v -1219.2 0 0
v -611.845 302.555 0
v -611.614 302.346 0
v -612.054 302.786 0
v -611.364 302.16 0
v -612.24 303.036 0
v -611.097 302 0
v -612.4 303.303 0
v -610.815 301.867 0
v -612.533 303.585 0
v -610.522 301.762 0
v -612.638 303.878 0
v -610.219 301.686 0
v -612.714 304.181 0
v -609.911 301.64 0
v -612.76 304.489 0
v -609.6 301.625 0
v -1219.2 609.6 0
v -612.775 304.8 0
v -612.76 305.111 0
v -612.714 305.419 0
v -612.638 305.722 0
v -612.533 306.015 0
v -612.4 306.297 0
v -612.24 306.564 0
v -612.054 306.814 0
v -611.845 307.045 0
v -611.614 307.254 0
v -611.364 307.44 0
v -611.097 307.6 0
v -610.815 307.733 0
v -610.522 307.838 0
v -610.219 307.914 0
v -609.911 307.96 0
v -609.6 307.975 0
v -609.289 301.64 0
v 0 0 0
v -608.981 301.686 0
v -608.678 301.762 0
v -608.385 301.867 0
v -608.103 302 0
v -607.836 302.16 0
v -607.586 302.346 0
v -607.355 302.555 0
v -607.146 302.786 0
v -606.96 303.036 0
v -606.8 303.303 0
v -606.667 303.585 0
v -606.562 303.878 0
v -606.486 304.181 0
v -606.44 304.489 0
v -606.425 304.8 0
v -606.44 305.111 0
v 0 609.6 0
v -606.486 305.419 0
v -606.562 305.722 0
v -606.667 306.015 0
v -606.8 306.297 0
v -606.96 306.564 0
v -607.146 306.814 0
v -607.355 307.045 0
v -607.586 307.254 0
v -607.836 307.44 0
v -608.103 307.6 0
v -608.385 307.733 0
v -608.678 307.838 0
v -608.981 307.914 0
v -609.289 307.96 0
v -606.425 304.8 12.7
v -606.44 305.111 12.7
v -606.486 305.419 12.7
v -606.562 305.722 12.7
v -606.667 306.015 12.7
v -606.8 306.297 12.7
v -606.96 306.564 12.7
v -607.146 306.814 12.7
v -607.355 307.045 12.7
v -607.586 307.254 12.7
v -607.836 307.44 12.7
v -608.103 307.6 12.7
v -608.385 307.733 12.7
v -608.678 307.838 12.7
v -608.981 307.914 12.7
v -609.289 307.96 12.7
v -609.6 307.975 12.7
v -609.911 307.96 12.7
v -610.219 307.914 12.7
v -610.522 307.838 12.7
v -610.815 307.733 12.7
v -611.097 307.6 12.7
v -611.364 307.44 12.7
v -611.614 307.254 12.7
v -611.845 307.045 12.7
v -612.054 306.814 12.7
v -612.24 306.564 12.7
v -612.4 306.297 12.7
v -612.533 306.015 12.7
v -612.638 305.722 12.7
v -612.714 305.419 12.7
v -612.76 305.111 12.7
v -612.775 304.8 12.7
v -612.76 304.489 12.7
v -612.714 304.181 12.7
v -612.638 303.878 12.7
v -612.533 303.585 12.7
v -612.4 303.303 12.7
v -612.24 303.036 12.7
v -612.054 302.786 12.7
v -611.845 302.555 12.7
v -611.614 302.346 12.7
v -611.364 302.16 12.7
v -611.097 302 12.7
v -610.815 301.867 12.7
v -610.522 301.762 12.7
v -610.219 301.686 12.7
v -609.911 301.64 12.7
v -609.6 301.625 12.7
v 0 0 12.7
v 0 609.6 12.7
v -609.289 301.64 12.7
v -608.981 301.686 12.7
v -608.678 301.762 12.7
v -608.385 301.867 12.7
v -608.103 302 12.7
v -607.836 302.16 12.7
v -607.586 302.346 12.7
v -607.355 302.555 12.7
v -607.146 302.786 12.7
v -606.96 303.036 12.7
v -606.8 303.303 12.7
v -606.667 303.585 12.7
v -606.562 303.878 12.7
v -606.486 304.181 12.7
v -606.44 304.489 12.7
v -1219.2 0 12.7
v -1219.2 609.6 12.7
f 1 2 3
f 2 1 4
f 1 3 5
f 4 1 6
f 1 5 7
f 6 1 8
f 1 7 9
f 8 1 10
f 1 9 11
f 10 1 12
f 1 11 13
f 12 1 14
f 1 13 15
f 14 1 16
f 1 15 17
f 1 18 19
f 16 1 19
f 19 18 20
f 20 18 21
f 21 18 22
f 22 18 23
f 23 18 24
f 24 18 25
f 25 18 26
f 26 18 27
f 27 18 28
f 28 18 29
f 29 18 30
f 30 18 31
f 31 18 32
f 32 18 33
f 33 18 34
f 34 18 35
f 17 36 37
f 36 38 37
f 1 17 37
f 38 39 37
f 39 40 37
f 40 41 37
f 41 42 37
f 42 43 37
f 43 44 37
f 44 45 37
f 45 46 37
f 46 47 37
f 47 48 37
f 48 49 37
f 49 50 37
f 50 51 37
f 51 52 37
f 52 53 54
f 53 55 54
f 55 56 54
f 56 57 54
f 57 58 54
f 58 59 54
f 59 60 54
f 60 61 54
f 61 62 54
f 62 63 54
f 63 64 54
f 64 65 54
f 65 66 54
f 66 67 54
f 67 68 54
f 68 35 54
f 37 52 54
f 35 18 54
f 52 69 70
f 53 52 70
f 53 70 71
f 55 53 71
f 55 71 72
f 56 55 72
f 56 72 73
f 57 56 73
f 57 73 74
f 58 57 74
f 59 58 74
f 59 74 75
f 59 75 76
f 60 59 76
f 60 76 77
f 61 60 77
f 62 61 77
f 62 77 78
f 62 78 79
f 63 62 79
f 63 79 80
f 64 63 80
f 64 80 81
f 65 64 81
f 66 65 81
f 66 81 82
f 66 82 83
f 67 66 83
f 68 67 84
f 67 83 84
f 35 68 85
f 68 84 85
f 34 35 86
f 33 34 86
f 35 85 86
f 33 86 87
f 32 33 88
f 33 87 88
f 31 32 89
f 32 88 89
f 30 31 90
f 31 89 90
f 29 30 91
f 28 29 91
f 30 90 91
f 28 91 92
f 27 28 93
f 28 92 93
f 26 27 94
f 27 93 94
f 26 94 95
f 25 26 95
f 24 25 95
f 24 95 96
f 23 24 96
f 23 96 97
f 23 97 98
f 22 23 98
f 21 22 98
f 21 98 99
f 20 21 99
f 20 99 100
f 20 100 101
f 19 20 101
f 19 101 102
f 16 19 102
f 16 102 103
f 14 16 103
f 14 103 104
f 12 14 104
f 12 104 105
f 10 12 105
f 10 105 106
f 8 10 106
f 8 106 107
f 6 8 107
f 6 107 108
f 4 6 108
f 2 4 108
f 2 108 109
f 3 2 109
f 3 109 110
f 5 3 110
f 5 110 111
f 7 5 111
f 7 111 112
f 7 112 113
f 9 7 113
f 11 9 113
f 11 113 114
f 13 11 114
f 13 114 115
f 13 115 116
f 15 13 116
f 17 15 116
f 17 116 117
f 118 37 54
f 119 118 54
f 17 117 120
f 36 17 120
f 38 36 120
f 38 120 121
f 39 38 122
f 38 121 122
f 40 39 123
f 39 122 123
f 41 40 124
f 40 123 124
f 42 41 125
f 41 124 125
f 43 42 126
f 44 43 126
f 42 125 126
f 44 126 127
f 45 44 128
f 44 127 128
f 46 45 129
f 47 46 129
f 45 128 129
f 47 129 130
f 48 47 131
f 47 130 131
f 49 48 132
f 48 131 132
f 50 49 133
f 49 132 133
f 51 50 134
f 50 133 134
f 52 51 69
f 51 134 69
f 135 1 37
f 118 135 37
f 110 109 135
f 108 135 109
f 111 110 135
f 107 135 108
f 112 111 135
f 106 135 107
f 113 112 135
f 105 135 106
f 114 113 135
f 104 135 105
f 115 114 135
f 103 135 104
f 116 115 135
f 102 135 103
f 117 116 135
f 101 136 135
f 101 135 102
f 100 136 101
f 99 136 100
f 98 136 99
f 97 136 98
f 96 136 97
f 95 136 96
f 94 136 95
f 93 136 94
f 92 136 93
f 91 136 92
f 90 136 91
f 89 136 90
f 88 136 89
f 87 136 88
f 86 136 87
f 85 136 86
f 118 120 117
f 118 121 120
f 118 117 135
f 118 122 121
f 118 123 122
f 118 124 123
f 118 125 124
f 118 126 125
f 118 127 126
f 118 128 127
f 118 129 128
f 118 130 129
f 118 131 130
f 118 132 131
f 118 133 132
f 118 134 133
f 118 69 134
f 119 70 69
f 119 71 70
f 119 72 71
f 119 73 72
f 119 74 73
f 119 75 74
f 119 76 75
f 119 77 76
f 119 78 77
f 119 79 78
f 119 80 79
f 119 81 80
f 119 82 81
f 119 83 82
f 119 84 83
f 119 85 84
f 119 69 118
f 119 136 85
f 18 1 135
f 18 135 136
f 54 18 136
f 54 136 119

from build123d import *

# Parameters (mm, degrees)
F0_W     = 1219.2
F0_H     = 609.6
F1_DEPTH = 12.7
F3_DEPTH = 25.4


with BuildPart() as f1:
    # F0 (on Top) → F1 (new body)
    with BuildSketch(Plane.XY):
        with Locations((-609.6, 304.8)):
            Rectangle(F0_W, F0_H)
    extrude(amount=F1_DEPTH)

    # F2 (on face) → F3 (cut)
    with BuildSketch(Plane.XY.offset(12.7)):
        with BuildLine():
            ThreePointArc((-609.6, 301.625), (-607.354936, 302.554936), (-606.425, 304.8))
            ThreePointArc((-606.425, 304.8), (-611.845064, 307.045064), (-609.6, 301.625))
        make_face()
    extrude(amount=-F3_DEPTH, mode=Mode.SUBTRACT)


solid = f1.part
